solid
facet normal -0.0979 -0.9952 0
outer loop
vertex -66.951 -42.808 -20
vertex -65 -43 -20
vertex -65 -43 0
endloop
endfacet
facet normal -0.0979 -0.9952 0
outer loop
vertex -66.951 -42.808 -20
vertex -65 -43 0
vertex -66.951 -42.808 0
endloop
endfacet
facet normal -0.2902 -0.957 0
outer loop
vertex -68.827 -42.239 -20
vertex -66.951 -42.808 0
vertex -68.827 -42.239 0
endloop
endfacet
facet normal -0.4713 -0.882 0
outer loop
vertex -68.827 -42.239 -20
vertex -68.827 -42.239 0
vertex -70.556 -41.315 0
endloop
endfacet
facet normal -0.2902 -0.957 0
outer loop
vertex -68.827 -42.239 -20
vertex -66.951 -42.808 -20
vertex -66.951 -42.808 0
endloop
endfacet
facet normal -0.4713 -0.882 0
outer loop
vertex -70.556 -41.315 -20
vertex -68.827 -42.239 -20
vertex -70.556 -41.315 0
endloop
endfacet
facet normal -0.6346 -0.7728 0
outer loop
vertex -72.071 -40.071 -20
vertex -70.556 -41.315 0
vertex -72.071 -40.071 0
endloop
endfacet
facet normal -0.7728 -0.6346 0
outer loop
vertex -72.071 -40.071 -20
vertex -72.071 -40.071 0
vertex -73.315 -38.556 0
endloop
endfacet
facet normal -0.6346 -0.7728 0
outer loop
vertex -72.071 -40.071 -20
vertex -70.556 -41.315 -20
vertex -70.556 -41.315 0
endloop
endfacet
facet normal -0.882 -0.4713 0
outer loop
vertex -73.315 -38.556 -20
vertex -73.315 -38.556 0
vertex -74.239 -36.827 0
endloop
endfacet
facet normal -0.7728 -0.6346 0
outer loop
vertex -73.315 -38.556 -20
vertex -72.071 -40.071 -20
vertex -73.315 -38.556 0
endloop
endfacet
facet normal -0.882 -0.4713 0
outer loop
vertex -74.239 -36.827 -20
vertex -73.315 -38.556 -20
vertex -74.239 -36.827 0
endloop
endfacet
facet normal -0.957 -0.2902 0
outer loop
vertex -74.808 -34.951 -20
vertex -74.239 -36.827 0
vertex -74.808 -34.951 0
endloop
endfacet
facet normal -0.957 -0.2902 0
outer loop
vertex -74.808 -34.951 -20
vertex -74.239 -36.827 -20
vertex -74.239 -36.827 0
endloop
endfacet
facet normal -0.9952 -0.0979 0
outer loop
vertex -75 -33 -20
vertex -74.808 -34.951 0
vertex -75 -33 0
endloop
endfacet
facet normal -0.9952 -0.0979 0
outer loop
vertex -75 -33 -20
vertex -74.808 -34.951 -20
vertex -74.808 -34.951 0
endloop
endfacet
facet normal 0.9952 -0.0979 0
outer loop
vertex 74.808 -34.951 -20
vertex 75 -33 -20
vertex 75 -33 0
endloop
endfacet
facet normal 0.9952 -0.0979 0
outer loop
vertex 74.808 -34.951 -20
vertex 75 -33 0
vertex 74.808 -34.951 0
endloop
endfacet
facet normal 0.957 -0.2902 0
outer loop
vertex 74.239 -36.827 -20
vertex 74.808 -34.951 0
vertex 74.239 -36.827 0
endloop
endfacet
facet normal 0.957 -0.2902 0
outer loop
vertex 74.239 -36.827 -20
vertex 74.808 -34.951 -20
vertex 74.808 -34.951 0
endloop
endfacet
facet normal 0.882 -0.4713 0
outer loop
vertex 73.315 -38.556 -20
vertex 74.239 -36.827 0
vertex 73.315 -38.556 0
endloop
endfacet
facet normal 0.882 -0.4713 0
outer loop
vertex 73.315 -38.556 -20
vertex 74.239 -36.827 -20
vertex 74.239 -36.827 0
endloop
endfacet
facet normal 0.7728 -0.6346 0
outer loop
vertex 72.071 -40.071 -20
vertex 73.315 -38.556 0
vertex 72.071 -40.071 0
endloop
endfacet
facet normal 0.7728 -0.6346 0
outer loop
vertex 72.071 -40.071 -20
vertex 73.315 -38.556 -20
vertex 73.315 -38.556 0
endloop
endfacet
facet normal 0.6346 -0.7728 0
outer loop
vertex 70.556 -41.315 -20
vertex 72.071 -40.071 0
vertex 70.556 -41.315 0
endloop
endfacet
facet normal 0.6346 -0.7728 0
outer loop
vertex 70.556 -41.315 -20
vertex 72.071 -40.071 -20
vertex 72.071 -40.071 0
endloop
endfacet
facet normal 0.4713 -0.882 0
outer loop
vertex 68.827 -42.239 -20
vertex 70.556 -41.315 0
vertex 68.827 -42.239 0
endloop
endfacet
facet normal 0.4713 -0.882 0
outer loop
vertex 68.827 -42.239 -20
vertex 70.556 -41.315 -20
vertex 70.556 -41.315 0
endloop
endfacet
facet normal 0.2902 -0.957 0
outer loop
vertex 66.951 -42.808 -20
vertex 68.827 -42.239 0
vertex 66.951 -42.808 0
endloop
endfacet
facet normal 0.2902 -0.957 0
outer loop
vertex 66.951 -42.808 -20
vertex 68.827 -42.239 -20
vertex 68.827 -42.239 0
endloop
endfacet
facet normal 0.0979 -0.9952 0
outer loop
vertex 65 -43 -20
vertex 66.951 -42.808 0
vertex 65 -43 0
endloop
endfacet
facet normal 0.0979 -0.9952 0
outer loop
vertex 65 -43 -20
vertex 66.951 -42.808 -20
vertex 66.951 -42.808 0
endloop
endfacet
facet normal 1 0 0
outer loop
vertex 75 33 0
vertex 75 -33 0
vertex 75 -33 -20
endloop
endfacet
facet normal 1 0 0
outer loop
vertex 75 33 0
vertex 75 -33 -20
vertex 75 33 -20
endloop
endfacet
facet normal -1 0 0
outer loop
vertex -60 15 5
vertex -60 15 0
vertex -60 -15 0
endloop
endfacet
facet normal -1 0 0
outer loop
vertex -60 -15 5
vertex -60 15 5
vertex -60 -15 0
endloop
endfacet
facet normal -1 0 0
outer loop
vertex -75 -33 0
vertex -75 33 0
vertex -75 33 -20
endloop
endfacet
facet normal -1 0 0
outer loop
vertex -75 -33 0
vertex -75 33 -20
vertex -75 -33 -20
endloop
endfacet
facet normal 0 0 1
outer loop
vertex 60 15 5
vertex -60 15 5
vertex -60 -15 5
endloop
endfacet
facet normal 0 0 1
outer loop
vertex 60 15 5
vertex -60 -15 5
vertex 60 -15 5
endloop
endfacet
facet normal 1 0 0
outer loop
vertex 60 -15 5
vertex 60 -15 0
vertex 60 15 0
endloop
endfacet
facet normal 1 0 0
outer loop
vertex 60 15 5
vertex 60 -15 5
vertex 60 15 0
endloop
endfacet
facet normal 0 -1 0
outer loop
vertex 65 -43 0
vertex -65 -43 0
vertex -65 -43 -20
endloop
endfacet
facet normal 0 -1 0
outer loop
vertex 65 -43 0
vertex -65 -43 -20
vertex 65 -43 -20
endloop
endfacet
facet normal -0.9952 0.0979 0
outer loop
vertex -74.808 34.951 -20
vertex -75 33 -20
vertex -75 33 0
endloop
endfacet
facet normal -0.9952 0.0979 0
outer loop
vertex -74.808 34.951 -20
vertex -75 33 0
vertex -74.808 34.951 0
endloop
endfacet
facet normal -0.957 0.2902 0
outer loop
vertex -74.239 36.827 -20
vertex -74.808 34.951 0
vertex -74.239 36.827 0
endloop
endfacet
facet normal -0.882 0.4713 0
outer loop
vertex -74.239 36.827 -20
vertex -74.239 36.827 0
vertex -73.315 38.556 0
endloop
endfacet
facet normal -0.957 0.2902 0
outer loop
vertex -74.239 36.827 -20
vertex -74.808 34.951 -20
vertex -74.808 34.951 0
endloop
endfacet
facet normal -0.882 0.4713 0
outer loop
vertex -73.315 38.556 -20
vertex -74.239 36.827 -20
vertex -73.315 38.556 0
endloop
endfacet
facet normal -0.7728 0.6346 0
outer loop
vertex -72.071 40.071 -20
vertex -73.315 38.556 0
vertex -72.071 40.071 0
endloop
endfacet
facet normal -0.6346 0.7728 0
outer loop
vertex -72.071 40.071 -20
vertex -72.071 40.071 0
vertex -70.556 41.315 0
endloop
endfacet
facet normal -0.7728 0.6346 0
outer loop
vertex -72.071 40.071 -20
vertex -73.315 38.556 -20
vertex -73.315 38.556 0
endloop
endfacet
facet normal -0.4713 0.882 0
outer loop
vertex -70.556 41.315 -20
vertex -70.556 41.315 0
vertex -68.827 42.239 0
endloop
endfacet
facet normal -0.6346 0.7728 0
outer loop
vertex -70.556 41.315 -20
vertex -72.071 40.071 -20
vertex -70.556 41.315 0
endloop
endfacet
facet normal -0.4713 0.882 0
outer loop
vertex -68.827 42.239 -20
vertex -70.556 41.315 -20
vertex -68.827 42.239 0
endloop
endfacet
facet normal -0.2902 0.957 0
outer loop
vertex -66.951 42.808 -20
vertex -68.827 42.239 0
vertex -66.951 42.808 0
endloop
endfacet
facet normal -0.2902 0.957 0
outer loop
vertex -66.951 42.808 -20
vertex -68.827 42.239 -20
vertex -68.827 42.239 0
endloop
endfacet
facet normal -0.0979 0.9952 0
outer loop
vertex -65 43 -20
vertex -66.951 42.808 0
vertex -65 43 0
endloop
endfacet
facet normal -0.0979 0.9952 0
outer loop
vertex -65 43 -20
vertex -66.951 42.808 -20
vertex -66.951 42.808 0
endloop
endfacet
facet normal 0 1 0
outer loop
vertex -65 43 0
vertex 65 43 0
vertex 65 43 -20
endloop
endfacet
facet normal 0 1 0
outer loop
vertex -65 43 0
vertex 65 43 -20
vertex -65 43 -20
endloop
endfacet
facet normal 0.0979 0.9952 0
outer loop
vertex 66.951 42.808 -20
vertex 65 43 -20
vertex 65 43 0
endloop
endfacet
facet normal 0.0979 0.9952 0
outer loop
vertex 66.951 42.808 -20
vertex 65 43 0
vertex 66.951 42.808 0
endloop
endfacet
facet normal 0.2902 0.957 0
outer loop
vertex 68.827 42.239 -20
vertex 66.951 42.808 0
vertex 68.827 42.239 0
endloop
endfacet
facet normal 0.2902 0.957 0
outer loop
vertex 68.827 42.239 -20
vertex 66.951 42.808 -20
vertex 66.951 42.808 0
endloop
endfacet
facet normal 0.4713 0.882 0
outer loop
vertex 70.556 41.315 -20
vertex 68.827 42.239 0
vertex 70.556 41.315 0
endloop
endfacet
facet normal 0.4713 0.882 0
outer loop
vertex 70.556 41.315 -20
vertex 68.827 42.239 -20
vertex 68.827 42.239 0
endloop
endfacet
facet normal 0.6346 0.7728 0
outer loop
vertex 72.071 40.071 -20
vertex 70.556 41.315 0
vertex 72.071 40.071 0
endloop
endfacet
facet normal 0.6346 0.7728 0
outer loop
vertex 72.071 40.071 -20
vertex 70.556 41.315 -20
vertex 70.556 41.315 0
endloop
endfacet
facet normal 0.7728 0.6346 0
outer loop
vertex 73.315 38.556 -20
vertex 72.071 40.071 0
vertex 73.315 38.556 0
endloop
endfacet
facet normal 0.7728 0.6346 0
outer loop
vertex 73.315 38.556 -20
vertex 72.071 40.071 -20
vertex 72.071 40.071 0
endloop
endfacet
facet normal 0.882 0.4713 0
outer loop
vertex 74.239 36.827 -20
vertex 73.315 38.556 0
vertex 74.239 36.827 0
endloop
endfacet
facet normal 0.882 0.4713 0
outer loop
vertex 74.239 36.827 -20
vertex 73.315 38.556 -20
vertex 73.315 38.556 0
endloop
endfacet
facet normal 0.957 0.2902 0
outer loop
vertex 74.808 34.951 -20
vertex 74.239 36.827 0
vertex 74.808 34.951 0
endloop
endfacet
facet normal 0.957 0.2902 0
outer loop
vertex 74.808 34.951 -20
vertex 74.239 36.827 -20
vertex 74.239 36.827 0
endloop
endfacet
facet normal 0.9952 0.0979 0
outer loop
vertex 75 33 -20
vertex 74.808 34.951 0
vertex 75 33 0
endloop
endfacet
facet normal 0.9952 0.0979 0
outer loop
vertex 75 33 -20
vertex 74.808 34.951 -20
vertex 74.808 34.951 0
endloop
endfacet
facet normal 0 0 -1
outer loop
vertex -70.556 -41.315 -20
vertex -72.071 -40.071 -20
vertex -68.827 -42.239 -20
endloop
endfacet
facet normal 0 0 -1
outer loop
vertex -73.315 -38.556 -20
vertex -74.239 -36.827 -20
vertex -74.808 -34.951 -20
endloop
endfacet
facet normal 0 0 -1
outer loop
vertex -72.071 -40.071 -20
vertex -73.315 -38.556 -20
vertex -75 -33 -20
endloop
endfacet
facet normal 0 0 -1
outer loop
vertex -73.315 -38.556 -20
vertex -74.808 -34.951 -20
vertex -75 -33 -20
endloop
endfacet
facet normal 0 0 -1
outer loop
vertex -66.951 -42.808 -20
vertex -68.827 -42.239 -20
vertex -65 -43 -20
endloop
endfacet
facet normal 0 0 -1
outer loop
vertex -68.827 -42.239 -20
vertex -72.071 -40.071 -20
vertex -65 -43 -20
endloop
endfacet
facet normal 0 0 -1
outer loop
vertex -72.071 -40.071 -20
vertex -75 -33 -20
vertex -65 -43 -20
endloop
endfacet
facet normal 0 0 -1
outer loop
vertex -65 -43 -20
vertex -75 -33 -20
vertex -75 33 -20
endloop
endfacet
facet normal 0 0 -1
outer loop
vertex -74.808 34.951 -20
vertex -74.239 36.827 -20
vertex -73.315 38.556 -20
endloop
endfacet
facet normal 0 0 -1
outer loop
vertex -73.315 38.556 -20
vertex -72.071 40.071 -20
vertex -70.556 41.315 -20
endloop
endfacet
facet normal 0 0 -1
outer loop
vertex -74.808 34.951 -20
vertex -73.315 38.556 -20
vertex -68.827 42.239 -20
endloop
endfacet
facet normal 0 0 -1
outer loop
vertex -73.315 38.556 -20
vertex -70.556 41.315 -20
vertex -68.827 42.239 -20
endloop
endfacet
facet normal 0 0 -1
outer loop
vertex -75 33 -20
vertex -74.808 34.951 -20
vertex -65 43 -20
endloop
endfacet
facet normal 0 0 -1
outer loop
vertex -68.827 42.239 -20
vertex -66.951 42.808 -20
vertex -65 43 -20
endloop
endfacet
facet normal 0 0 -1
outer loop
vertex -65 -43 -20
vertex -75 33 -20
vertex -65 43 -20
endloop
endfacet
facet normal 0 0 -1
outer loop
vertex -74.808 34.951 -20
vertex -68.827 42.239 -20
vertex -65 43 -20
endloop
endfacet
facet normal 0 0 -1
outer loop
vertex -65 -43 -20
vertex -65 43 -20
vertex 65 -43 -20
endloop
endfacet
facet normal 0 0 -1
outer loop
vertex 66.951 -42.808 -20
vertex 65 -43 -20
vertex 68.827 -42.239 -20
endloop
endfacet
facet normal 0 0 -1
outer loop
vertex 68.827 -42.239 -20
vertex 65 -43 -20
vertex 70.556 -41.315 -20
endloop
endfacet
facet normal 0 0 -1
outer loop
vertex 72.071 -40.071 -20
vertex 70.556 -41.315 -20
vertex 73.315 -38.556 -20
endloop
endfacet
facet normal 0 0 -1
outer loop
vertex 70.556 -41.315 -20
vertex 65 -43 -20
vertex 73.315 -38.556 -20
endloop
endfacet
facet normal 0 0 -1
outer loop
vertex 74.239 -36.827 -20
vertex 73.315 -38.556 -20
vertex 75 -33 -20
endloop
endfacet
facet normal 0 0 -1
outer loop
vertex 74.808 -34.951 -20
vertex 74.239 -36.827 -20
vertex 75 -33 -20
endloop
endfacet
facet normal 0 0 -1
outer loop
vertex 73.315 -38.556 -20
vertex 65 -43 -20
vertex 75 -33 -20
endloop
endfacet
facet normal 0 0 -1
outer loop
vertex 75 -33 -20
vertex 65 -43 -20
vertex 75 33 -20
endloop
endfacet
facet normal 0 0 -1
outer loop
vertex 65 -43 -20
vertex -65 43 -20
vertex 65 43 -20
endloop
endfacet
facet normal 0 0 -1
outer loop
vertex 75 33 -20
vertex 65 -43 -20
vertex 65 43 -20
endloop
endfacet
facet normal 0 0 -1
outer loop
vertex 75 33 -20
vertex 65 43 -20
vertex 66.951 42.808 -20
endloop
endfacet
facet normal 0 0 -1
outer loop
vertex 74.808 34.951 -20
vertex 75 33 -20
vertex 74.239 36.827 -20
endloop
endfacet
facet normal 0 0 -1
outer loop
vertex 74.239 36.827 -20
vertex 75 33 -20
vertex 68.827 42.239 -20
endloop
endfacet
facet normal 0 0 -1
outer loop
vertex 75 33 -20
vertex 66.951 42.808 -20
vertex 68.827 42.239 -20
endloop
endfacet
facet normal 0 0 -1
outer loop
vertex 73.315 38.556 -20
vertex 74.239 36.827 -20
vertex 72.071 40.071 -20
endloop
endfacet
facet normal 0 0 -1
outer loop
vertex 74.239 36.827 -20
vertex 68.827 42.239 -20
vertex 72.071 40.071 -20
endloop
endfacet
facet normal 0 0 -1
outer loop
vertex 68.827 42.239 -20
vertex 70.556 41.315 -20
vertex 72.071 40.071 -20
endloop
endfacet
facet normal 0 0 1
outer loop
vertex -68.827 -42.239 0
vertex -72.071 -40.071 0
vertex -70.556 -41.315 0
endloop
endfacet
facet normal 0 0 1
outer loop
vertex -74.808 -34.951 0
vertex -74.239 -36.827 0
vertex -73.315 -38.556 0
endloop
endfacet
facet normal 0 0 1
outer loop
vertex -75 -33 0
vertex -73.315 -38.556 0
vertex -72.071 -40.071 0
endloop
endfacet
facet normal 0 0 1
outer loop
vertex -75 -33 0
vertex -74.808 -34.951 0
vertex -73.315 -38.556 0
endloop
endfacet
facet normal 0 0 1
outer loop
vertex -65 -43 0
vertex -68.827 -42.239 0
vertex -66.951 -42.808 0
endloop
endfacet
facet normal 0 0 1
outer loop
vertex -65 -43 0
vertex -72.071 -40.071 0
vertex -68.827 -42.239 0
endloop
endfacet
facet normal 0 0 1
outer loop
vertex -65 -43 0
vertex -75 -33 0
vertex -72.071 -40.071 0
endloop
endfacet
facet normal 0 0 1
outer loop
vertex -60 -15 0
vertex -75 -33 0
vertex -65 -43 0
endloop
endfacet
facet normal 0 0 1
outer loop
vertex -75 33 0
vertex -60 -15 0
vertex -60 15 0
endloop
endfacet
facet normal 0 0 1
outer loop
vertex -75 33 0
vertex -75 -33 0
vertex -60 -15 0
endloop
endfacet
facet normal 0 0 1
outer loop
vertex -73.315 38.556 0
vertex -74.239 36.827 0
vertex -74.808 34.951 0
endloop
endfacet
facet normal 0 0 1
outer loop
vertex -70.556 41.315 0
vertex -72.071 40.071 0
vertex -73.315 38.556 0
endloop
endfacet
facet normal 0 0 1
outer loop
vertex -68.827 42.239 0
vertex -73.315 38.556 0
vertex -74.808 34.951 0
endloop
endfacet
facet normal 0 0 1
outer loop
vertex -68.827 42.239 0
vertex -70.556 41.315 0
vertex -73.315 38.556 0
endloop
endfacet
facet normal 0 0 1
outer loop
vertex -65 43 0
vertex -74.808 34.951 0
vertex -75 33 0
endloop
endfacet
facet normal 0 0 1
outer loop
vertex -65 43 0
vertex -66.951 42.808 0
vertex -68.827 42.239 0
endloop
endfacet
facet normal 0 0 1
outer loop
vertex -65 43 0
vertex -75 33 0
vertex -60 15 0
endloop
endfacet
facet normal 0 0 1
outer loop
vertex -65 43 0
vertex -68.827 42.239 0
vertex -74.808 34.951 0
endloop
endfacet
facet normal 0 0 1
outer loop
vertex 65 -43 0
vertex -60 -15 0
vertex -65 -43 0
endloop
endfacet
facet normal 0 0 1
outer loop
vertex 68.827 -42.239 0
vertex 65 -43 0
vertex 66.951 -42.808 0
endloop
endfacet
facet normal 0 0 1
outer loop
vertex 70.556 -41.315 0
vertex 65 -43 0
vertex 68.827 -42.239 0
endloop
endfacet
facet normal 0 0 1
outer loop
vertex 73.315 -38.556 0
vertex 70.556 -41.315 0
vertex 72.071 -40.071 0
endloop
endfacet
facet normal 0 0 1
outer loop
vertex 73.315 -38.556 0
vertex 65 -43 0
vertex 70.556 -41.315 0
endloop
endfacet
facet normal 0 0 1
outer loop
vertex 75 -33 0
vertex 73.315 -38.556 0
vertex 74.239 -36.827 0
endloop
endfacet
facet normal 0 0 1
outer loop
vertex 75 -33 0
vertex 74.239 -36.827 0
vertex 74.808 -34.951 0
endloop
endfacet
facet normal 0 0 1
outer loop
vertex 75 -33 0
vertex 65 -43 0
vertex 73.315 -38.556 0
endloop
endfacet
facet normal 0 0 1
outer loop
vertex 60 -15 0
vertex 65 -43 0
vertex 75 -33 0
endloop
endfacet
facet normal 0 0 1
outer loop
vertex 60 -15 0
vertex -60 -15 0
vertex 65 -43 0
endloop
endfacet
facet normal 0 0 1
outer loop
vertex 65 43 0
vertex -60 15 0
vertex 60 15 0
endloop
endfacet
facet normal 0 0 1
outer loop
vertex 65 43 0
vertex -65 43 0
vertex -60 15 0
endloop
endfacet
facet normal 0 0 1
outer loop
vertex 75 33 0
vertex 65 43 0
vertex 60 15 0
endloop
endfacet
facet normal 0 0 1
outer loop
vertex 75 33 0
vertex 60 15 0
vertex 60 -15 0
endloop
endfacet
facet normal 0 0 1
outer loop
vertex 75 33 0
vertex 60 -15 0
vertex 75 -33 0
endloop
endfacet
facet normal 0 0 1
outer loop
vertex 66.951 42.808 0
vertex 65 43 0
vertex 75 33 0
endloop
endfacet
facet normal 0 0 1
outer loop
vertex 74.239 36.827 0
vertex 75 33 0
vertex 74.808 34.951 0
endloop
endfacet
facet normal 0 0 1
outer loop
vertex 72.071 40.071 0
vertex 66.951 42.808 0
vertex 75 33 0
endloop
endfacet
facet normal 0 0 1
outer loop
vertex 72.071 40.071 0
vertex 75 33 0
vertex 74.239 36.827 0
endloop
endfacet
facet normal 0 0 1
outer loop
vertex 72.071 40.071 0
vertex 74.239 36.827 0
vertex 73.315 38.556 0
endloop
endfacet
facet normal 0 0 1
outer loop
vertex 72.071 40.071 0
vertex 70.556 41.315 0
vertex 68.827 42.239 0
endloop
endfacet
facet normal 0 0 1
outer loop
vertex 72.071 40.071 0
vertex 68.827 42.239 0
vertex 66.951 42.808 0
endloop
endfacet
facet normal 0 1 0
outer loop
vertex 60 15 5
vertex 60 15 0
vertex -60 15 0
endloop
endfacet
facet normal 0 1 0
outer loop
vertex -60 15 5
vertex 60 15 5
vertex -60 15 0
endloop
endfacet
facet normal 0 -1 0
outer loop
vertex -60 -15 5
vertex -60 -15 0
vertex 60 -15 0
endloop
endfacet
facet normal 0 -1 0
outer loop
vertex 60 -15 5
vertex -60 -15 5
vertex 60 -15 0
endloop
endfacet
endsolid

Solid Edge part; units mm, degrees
sketch "Sketch1" plane through (0, 0, 0) normal (0, 0, 1) x (1, 0, 0)
  line L0 (-75, -43) -> (75, -43)
  line L1 (75, -43) -> (75, 43)
  line L2 (75, 43) -> (-75, 43)
  line L3 (-75, 43) -> (-75, -43)
extrude "Protrusion1" add sketch "Sketch1" against normal blind 20
sketch "Sketch2" plane through (0, 0, 0) normal (0, 0, 1) x (1, 0, 0)
  line L0 (-60, -15) -> (60, -15)
  line L1 (60, -15) -> (60, 15)
  line L2 (60, 15) -> (-60, 15)
  line L3 (-60, 15) -> (-60, -15)
extrude "ExtrudedProtrusion_2" add sketch "Sketch2" along normal blind 5
fillet "Round_1" radius 10 4 edges at (75, -43, -10) (75, 43, -10) (-75, -43, -10) (-75, 43, -10)
